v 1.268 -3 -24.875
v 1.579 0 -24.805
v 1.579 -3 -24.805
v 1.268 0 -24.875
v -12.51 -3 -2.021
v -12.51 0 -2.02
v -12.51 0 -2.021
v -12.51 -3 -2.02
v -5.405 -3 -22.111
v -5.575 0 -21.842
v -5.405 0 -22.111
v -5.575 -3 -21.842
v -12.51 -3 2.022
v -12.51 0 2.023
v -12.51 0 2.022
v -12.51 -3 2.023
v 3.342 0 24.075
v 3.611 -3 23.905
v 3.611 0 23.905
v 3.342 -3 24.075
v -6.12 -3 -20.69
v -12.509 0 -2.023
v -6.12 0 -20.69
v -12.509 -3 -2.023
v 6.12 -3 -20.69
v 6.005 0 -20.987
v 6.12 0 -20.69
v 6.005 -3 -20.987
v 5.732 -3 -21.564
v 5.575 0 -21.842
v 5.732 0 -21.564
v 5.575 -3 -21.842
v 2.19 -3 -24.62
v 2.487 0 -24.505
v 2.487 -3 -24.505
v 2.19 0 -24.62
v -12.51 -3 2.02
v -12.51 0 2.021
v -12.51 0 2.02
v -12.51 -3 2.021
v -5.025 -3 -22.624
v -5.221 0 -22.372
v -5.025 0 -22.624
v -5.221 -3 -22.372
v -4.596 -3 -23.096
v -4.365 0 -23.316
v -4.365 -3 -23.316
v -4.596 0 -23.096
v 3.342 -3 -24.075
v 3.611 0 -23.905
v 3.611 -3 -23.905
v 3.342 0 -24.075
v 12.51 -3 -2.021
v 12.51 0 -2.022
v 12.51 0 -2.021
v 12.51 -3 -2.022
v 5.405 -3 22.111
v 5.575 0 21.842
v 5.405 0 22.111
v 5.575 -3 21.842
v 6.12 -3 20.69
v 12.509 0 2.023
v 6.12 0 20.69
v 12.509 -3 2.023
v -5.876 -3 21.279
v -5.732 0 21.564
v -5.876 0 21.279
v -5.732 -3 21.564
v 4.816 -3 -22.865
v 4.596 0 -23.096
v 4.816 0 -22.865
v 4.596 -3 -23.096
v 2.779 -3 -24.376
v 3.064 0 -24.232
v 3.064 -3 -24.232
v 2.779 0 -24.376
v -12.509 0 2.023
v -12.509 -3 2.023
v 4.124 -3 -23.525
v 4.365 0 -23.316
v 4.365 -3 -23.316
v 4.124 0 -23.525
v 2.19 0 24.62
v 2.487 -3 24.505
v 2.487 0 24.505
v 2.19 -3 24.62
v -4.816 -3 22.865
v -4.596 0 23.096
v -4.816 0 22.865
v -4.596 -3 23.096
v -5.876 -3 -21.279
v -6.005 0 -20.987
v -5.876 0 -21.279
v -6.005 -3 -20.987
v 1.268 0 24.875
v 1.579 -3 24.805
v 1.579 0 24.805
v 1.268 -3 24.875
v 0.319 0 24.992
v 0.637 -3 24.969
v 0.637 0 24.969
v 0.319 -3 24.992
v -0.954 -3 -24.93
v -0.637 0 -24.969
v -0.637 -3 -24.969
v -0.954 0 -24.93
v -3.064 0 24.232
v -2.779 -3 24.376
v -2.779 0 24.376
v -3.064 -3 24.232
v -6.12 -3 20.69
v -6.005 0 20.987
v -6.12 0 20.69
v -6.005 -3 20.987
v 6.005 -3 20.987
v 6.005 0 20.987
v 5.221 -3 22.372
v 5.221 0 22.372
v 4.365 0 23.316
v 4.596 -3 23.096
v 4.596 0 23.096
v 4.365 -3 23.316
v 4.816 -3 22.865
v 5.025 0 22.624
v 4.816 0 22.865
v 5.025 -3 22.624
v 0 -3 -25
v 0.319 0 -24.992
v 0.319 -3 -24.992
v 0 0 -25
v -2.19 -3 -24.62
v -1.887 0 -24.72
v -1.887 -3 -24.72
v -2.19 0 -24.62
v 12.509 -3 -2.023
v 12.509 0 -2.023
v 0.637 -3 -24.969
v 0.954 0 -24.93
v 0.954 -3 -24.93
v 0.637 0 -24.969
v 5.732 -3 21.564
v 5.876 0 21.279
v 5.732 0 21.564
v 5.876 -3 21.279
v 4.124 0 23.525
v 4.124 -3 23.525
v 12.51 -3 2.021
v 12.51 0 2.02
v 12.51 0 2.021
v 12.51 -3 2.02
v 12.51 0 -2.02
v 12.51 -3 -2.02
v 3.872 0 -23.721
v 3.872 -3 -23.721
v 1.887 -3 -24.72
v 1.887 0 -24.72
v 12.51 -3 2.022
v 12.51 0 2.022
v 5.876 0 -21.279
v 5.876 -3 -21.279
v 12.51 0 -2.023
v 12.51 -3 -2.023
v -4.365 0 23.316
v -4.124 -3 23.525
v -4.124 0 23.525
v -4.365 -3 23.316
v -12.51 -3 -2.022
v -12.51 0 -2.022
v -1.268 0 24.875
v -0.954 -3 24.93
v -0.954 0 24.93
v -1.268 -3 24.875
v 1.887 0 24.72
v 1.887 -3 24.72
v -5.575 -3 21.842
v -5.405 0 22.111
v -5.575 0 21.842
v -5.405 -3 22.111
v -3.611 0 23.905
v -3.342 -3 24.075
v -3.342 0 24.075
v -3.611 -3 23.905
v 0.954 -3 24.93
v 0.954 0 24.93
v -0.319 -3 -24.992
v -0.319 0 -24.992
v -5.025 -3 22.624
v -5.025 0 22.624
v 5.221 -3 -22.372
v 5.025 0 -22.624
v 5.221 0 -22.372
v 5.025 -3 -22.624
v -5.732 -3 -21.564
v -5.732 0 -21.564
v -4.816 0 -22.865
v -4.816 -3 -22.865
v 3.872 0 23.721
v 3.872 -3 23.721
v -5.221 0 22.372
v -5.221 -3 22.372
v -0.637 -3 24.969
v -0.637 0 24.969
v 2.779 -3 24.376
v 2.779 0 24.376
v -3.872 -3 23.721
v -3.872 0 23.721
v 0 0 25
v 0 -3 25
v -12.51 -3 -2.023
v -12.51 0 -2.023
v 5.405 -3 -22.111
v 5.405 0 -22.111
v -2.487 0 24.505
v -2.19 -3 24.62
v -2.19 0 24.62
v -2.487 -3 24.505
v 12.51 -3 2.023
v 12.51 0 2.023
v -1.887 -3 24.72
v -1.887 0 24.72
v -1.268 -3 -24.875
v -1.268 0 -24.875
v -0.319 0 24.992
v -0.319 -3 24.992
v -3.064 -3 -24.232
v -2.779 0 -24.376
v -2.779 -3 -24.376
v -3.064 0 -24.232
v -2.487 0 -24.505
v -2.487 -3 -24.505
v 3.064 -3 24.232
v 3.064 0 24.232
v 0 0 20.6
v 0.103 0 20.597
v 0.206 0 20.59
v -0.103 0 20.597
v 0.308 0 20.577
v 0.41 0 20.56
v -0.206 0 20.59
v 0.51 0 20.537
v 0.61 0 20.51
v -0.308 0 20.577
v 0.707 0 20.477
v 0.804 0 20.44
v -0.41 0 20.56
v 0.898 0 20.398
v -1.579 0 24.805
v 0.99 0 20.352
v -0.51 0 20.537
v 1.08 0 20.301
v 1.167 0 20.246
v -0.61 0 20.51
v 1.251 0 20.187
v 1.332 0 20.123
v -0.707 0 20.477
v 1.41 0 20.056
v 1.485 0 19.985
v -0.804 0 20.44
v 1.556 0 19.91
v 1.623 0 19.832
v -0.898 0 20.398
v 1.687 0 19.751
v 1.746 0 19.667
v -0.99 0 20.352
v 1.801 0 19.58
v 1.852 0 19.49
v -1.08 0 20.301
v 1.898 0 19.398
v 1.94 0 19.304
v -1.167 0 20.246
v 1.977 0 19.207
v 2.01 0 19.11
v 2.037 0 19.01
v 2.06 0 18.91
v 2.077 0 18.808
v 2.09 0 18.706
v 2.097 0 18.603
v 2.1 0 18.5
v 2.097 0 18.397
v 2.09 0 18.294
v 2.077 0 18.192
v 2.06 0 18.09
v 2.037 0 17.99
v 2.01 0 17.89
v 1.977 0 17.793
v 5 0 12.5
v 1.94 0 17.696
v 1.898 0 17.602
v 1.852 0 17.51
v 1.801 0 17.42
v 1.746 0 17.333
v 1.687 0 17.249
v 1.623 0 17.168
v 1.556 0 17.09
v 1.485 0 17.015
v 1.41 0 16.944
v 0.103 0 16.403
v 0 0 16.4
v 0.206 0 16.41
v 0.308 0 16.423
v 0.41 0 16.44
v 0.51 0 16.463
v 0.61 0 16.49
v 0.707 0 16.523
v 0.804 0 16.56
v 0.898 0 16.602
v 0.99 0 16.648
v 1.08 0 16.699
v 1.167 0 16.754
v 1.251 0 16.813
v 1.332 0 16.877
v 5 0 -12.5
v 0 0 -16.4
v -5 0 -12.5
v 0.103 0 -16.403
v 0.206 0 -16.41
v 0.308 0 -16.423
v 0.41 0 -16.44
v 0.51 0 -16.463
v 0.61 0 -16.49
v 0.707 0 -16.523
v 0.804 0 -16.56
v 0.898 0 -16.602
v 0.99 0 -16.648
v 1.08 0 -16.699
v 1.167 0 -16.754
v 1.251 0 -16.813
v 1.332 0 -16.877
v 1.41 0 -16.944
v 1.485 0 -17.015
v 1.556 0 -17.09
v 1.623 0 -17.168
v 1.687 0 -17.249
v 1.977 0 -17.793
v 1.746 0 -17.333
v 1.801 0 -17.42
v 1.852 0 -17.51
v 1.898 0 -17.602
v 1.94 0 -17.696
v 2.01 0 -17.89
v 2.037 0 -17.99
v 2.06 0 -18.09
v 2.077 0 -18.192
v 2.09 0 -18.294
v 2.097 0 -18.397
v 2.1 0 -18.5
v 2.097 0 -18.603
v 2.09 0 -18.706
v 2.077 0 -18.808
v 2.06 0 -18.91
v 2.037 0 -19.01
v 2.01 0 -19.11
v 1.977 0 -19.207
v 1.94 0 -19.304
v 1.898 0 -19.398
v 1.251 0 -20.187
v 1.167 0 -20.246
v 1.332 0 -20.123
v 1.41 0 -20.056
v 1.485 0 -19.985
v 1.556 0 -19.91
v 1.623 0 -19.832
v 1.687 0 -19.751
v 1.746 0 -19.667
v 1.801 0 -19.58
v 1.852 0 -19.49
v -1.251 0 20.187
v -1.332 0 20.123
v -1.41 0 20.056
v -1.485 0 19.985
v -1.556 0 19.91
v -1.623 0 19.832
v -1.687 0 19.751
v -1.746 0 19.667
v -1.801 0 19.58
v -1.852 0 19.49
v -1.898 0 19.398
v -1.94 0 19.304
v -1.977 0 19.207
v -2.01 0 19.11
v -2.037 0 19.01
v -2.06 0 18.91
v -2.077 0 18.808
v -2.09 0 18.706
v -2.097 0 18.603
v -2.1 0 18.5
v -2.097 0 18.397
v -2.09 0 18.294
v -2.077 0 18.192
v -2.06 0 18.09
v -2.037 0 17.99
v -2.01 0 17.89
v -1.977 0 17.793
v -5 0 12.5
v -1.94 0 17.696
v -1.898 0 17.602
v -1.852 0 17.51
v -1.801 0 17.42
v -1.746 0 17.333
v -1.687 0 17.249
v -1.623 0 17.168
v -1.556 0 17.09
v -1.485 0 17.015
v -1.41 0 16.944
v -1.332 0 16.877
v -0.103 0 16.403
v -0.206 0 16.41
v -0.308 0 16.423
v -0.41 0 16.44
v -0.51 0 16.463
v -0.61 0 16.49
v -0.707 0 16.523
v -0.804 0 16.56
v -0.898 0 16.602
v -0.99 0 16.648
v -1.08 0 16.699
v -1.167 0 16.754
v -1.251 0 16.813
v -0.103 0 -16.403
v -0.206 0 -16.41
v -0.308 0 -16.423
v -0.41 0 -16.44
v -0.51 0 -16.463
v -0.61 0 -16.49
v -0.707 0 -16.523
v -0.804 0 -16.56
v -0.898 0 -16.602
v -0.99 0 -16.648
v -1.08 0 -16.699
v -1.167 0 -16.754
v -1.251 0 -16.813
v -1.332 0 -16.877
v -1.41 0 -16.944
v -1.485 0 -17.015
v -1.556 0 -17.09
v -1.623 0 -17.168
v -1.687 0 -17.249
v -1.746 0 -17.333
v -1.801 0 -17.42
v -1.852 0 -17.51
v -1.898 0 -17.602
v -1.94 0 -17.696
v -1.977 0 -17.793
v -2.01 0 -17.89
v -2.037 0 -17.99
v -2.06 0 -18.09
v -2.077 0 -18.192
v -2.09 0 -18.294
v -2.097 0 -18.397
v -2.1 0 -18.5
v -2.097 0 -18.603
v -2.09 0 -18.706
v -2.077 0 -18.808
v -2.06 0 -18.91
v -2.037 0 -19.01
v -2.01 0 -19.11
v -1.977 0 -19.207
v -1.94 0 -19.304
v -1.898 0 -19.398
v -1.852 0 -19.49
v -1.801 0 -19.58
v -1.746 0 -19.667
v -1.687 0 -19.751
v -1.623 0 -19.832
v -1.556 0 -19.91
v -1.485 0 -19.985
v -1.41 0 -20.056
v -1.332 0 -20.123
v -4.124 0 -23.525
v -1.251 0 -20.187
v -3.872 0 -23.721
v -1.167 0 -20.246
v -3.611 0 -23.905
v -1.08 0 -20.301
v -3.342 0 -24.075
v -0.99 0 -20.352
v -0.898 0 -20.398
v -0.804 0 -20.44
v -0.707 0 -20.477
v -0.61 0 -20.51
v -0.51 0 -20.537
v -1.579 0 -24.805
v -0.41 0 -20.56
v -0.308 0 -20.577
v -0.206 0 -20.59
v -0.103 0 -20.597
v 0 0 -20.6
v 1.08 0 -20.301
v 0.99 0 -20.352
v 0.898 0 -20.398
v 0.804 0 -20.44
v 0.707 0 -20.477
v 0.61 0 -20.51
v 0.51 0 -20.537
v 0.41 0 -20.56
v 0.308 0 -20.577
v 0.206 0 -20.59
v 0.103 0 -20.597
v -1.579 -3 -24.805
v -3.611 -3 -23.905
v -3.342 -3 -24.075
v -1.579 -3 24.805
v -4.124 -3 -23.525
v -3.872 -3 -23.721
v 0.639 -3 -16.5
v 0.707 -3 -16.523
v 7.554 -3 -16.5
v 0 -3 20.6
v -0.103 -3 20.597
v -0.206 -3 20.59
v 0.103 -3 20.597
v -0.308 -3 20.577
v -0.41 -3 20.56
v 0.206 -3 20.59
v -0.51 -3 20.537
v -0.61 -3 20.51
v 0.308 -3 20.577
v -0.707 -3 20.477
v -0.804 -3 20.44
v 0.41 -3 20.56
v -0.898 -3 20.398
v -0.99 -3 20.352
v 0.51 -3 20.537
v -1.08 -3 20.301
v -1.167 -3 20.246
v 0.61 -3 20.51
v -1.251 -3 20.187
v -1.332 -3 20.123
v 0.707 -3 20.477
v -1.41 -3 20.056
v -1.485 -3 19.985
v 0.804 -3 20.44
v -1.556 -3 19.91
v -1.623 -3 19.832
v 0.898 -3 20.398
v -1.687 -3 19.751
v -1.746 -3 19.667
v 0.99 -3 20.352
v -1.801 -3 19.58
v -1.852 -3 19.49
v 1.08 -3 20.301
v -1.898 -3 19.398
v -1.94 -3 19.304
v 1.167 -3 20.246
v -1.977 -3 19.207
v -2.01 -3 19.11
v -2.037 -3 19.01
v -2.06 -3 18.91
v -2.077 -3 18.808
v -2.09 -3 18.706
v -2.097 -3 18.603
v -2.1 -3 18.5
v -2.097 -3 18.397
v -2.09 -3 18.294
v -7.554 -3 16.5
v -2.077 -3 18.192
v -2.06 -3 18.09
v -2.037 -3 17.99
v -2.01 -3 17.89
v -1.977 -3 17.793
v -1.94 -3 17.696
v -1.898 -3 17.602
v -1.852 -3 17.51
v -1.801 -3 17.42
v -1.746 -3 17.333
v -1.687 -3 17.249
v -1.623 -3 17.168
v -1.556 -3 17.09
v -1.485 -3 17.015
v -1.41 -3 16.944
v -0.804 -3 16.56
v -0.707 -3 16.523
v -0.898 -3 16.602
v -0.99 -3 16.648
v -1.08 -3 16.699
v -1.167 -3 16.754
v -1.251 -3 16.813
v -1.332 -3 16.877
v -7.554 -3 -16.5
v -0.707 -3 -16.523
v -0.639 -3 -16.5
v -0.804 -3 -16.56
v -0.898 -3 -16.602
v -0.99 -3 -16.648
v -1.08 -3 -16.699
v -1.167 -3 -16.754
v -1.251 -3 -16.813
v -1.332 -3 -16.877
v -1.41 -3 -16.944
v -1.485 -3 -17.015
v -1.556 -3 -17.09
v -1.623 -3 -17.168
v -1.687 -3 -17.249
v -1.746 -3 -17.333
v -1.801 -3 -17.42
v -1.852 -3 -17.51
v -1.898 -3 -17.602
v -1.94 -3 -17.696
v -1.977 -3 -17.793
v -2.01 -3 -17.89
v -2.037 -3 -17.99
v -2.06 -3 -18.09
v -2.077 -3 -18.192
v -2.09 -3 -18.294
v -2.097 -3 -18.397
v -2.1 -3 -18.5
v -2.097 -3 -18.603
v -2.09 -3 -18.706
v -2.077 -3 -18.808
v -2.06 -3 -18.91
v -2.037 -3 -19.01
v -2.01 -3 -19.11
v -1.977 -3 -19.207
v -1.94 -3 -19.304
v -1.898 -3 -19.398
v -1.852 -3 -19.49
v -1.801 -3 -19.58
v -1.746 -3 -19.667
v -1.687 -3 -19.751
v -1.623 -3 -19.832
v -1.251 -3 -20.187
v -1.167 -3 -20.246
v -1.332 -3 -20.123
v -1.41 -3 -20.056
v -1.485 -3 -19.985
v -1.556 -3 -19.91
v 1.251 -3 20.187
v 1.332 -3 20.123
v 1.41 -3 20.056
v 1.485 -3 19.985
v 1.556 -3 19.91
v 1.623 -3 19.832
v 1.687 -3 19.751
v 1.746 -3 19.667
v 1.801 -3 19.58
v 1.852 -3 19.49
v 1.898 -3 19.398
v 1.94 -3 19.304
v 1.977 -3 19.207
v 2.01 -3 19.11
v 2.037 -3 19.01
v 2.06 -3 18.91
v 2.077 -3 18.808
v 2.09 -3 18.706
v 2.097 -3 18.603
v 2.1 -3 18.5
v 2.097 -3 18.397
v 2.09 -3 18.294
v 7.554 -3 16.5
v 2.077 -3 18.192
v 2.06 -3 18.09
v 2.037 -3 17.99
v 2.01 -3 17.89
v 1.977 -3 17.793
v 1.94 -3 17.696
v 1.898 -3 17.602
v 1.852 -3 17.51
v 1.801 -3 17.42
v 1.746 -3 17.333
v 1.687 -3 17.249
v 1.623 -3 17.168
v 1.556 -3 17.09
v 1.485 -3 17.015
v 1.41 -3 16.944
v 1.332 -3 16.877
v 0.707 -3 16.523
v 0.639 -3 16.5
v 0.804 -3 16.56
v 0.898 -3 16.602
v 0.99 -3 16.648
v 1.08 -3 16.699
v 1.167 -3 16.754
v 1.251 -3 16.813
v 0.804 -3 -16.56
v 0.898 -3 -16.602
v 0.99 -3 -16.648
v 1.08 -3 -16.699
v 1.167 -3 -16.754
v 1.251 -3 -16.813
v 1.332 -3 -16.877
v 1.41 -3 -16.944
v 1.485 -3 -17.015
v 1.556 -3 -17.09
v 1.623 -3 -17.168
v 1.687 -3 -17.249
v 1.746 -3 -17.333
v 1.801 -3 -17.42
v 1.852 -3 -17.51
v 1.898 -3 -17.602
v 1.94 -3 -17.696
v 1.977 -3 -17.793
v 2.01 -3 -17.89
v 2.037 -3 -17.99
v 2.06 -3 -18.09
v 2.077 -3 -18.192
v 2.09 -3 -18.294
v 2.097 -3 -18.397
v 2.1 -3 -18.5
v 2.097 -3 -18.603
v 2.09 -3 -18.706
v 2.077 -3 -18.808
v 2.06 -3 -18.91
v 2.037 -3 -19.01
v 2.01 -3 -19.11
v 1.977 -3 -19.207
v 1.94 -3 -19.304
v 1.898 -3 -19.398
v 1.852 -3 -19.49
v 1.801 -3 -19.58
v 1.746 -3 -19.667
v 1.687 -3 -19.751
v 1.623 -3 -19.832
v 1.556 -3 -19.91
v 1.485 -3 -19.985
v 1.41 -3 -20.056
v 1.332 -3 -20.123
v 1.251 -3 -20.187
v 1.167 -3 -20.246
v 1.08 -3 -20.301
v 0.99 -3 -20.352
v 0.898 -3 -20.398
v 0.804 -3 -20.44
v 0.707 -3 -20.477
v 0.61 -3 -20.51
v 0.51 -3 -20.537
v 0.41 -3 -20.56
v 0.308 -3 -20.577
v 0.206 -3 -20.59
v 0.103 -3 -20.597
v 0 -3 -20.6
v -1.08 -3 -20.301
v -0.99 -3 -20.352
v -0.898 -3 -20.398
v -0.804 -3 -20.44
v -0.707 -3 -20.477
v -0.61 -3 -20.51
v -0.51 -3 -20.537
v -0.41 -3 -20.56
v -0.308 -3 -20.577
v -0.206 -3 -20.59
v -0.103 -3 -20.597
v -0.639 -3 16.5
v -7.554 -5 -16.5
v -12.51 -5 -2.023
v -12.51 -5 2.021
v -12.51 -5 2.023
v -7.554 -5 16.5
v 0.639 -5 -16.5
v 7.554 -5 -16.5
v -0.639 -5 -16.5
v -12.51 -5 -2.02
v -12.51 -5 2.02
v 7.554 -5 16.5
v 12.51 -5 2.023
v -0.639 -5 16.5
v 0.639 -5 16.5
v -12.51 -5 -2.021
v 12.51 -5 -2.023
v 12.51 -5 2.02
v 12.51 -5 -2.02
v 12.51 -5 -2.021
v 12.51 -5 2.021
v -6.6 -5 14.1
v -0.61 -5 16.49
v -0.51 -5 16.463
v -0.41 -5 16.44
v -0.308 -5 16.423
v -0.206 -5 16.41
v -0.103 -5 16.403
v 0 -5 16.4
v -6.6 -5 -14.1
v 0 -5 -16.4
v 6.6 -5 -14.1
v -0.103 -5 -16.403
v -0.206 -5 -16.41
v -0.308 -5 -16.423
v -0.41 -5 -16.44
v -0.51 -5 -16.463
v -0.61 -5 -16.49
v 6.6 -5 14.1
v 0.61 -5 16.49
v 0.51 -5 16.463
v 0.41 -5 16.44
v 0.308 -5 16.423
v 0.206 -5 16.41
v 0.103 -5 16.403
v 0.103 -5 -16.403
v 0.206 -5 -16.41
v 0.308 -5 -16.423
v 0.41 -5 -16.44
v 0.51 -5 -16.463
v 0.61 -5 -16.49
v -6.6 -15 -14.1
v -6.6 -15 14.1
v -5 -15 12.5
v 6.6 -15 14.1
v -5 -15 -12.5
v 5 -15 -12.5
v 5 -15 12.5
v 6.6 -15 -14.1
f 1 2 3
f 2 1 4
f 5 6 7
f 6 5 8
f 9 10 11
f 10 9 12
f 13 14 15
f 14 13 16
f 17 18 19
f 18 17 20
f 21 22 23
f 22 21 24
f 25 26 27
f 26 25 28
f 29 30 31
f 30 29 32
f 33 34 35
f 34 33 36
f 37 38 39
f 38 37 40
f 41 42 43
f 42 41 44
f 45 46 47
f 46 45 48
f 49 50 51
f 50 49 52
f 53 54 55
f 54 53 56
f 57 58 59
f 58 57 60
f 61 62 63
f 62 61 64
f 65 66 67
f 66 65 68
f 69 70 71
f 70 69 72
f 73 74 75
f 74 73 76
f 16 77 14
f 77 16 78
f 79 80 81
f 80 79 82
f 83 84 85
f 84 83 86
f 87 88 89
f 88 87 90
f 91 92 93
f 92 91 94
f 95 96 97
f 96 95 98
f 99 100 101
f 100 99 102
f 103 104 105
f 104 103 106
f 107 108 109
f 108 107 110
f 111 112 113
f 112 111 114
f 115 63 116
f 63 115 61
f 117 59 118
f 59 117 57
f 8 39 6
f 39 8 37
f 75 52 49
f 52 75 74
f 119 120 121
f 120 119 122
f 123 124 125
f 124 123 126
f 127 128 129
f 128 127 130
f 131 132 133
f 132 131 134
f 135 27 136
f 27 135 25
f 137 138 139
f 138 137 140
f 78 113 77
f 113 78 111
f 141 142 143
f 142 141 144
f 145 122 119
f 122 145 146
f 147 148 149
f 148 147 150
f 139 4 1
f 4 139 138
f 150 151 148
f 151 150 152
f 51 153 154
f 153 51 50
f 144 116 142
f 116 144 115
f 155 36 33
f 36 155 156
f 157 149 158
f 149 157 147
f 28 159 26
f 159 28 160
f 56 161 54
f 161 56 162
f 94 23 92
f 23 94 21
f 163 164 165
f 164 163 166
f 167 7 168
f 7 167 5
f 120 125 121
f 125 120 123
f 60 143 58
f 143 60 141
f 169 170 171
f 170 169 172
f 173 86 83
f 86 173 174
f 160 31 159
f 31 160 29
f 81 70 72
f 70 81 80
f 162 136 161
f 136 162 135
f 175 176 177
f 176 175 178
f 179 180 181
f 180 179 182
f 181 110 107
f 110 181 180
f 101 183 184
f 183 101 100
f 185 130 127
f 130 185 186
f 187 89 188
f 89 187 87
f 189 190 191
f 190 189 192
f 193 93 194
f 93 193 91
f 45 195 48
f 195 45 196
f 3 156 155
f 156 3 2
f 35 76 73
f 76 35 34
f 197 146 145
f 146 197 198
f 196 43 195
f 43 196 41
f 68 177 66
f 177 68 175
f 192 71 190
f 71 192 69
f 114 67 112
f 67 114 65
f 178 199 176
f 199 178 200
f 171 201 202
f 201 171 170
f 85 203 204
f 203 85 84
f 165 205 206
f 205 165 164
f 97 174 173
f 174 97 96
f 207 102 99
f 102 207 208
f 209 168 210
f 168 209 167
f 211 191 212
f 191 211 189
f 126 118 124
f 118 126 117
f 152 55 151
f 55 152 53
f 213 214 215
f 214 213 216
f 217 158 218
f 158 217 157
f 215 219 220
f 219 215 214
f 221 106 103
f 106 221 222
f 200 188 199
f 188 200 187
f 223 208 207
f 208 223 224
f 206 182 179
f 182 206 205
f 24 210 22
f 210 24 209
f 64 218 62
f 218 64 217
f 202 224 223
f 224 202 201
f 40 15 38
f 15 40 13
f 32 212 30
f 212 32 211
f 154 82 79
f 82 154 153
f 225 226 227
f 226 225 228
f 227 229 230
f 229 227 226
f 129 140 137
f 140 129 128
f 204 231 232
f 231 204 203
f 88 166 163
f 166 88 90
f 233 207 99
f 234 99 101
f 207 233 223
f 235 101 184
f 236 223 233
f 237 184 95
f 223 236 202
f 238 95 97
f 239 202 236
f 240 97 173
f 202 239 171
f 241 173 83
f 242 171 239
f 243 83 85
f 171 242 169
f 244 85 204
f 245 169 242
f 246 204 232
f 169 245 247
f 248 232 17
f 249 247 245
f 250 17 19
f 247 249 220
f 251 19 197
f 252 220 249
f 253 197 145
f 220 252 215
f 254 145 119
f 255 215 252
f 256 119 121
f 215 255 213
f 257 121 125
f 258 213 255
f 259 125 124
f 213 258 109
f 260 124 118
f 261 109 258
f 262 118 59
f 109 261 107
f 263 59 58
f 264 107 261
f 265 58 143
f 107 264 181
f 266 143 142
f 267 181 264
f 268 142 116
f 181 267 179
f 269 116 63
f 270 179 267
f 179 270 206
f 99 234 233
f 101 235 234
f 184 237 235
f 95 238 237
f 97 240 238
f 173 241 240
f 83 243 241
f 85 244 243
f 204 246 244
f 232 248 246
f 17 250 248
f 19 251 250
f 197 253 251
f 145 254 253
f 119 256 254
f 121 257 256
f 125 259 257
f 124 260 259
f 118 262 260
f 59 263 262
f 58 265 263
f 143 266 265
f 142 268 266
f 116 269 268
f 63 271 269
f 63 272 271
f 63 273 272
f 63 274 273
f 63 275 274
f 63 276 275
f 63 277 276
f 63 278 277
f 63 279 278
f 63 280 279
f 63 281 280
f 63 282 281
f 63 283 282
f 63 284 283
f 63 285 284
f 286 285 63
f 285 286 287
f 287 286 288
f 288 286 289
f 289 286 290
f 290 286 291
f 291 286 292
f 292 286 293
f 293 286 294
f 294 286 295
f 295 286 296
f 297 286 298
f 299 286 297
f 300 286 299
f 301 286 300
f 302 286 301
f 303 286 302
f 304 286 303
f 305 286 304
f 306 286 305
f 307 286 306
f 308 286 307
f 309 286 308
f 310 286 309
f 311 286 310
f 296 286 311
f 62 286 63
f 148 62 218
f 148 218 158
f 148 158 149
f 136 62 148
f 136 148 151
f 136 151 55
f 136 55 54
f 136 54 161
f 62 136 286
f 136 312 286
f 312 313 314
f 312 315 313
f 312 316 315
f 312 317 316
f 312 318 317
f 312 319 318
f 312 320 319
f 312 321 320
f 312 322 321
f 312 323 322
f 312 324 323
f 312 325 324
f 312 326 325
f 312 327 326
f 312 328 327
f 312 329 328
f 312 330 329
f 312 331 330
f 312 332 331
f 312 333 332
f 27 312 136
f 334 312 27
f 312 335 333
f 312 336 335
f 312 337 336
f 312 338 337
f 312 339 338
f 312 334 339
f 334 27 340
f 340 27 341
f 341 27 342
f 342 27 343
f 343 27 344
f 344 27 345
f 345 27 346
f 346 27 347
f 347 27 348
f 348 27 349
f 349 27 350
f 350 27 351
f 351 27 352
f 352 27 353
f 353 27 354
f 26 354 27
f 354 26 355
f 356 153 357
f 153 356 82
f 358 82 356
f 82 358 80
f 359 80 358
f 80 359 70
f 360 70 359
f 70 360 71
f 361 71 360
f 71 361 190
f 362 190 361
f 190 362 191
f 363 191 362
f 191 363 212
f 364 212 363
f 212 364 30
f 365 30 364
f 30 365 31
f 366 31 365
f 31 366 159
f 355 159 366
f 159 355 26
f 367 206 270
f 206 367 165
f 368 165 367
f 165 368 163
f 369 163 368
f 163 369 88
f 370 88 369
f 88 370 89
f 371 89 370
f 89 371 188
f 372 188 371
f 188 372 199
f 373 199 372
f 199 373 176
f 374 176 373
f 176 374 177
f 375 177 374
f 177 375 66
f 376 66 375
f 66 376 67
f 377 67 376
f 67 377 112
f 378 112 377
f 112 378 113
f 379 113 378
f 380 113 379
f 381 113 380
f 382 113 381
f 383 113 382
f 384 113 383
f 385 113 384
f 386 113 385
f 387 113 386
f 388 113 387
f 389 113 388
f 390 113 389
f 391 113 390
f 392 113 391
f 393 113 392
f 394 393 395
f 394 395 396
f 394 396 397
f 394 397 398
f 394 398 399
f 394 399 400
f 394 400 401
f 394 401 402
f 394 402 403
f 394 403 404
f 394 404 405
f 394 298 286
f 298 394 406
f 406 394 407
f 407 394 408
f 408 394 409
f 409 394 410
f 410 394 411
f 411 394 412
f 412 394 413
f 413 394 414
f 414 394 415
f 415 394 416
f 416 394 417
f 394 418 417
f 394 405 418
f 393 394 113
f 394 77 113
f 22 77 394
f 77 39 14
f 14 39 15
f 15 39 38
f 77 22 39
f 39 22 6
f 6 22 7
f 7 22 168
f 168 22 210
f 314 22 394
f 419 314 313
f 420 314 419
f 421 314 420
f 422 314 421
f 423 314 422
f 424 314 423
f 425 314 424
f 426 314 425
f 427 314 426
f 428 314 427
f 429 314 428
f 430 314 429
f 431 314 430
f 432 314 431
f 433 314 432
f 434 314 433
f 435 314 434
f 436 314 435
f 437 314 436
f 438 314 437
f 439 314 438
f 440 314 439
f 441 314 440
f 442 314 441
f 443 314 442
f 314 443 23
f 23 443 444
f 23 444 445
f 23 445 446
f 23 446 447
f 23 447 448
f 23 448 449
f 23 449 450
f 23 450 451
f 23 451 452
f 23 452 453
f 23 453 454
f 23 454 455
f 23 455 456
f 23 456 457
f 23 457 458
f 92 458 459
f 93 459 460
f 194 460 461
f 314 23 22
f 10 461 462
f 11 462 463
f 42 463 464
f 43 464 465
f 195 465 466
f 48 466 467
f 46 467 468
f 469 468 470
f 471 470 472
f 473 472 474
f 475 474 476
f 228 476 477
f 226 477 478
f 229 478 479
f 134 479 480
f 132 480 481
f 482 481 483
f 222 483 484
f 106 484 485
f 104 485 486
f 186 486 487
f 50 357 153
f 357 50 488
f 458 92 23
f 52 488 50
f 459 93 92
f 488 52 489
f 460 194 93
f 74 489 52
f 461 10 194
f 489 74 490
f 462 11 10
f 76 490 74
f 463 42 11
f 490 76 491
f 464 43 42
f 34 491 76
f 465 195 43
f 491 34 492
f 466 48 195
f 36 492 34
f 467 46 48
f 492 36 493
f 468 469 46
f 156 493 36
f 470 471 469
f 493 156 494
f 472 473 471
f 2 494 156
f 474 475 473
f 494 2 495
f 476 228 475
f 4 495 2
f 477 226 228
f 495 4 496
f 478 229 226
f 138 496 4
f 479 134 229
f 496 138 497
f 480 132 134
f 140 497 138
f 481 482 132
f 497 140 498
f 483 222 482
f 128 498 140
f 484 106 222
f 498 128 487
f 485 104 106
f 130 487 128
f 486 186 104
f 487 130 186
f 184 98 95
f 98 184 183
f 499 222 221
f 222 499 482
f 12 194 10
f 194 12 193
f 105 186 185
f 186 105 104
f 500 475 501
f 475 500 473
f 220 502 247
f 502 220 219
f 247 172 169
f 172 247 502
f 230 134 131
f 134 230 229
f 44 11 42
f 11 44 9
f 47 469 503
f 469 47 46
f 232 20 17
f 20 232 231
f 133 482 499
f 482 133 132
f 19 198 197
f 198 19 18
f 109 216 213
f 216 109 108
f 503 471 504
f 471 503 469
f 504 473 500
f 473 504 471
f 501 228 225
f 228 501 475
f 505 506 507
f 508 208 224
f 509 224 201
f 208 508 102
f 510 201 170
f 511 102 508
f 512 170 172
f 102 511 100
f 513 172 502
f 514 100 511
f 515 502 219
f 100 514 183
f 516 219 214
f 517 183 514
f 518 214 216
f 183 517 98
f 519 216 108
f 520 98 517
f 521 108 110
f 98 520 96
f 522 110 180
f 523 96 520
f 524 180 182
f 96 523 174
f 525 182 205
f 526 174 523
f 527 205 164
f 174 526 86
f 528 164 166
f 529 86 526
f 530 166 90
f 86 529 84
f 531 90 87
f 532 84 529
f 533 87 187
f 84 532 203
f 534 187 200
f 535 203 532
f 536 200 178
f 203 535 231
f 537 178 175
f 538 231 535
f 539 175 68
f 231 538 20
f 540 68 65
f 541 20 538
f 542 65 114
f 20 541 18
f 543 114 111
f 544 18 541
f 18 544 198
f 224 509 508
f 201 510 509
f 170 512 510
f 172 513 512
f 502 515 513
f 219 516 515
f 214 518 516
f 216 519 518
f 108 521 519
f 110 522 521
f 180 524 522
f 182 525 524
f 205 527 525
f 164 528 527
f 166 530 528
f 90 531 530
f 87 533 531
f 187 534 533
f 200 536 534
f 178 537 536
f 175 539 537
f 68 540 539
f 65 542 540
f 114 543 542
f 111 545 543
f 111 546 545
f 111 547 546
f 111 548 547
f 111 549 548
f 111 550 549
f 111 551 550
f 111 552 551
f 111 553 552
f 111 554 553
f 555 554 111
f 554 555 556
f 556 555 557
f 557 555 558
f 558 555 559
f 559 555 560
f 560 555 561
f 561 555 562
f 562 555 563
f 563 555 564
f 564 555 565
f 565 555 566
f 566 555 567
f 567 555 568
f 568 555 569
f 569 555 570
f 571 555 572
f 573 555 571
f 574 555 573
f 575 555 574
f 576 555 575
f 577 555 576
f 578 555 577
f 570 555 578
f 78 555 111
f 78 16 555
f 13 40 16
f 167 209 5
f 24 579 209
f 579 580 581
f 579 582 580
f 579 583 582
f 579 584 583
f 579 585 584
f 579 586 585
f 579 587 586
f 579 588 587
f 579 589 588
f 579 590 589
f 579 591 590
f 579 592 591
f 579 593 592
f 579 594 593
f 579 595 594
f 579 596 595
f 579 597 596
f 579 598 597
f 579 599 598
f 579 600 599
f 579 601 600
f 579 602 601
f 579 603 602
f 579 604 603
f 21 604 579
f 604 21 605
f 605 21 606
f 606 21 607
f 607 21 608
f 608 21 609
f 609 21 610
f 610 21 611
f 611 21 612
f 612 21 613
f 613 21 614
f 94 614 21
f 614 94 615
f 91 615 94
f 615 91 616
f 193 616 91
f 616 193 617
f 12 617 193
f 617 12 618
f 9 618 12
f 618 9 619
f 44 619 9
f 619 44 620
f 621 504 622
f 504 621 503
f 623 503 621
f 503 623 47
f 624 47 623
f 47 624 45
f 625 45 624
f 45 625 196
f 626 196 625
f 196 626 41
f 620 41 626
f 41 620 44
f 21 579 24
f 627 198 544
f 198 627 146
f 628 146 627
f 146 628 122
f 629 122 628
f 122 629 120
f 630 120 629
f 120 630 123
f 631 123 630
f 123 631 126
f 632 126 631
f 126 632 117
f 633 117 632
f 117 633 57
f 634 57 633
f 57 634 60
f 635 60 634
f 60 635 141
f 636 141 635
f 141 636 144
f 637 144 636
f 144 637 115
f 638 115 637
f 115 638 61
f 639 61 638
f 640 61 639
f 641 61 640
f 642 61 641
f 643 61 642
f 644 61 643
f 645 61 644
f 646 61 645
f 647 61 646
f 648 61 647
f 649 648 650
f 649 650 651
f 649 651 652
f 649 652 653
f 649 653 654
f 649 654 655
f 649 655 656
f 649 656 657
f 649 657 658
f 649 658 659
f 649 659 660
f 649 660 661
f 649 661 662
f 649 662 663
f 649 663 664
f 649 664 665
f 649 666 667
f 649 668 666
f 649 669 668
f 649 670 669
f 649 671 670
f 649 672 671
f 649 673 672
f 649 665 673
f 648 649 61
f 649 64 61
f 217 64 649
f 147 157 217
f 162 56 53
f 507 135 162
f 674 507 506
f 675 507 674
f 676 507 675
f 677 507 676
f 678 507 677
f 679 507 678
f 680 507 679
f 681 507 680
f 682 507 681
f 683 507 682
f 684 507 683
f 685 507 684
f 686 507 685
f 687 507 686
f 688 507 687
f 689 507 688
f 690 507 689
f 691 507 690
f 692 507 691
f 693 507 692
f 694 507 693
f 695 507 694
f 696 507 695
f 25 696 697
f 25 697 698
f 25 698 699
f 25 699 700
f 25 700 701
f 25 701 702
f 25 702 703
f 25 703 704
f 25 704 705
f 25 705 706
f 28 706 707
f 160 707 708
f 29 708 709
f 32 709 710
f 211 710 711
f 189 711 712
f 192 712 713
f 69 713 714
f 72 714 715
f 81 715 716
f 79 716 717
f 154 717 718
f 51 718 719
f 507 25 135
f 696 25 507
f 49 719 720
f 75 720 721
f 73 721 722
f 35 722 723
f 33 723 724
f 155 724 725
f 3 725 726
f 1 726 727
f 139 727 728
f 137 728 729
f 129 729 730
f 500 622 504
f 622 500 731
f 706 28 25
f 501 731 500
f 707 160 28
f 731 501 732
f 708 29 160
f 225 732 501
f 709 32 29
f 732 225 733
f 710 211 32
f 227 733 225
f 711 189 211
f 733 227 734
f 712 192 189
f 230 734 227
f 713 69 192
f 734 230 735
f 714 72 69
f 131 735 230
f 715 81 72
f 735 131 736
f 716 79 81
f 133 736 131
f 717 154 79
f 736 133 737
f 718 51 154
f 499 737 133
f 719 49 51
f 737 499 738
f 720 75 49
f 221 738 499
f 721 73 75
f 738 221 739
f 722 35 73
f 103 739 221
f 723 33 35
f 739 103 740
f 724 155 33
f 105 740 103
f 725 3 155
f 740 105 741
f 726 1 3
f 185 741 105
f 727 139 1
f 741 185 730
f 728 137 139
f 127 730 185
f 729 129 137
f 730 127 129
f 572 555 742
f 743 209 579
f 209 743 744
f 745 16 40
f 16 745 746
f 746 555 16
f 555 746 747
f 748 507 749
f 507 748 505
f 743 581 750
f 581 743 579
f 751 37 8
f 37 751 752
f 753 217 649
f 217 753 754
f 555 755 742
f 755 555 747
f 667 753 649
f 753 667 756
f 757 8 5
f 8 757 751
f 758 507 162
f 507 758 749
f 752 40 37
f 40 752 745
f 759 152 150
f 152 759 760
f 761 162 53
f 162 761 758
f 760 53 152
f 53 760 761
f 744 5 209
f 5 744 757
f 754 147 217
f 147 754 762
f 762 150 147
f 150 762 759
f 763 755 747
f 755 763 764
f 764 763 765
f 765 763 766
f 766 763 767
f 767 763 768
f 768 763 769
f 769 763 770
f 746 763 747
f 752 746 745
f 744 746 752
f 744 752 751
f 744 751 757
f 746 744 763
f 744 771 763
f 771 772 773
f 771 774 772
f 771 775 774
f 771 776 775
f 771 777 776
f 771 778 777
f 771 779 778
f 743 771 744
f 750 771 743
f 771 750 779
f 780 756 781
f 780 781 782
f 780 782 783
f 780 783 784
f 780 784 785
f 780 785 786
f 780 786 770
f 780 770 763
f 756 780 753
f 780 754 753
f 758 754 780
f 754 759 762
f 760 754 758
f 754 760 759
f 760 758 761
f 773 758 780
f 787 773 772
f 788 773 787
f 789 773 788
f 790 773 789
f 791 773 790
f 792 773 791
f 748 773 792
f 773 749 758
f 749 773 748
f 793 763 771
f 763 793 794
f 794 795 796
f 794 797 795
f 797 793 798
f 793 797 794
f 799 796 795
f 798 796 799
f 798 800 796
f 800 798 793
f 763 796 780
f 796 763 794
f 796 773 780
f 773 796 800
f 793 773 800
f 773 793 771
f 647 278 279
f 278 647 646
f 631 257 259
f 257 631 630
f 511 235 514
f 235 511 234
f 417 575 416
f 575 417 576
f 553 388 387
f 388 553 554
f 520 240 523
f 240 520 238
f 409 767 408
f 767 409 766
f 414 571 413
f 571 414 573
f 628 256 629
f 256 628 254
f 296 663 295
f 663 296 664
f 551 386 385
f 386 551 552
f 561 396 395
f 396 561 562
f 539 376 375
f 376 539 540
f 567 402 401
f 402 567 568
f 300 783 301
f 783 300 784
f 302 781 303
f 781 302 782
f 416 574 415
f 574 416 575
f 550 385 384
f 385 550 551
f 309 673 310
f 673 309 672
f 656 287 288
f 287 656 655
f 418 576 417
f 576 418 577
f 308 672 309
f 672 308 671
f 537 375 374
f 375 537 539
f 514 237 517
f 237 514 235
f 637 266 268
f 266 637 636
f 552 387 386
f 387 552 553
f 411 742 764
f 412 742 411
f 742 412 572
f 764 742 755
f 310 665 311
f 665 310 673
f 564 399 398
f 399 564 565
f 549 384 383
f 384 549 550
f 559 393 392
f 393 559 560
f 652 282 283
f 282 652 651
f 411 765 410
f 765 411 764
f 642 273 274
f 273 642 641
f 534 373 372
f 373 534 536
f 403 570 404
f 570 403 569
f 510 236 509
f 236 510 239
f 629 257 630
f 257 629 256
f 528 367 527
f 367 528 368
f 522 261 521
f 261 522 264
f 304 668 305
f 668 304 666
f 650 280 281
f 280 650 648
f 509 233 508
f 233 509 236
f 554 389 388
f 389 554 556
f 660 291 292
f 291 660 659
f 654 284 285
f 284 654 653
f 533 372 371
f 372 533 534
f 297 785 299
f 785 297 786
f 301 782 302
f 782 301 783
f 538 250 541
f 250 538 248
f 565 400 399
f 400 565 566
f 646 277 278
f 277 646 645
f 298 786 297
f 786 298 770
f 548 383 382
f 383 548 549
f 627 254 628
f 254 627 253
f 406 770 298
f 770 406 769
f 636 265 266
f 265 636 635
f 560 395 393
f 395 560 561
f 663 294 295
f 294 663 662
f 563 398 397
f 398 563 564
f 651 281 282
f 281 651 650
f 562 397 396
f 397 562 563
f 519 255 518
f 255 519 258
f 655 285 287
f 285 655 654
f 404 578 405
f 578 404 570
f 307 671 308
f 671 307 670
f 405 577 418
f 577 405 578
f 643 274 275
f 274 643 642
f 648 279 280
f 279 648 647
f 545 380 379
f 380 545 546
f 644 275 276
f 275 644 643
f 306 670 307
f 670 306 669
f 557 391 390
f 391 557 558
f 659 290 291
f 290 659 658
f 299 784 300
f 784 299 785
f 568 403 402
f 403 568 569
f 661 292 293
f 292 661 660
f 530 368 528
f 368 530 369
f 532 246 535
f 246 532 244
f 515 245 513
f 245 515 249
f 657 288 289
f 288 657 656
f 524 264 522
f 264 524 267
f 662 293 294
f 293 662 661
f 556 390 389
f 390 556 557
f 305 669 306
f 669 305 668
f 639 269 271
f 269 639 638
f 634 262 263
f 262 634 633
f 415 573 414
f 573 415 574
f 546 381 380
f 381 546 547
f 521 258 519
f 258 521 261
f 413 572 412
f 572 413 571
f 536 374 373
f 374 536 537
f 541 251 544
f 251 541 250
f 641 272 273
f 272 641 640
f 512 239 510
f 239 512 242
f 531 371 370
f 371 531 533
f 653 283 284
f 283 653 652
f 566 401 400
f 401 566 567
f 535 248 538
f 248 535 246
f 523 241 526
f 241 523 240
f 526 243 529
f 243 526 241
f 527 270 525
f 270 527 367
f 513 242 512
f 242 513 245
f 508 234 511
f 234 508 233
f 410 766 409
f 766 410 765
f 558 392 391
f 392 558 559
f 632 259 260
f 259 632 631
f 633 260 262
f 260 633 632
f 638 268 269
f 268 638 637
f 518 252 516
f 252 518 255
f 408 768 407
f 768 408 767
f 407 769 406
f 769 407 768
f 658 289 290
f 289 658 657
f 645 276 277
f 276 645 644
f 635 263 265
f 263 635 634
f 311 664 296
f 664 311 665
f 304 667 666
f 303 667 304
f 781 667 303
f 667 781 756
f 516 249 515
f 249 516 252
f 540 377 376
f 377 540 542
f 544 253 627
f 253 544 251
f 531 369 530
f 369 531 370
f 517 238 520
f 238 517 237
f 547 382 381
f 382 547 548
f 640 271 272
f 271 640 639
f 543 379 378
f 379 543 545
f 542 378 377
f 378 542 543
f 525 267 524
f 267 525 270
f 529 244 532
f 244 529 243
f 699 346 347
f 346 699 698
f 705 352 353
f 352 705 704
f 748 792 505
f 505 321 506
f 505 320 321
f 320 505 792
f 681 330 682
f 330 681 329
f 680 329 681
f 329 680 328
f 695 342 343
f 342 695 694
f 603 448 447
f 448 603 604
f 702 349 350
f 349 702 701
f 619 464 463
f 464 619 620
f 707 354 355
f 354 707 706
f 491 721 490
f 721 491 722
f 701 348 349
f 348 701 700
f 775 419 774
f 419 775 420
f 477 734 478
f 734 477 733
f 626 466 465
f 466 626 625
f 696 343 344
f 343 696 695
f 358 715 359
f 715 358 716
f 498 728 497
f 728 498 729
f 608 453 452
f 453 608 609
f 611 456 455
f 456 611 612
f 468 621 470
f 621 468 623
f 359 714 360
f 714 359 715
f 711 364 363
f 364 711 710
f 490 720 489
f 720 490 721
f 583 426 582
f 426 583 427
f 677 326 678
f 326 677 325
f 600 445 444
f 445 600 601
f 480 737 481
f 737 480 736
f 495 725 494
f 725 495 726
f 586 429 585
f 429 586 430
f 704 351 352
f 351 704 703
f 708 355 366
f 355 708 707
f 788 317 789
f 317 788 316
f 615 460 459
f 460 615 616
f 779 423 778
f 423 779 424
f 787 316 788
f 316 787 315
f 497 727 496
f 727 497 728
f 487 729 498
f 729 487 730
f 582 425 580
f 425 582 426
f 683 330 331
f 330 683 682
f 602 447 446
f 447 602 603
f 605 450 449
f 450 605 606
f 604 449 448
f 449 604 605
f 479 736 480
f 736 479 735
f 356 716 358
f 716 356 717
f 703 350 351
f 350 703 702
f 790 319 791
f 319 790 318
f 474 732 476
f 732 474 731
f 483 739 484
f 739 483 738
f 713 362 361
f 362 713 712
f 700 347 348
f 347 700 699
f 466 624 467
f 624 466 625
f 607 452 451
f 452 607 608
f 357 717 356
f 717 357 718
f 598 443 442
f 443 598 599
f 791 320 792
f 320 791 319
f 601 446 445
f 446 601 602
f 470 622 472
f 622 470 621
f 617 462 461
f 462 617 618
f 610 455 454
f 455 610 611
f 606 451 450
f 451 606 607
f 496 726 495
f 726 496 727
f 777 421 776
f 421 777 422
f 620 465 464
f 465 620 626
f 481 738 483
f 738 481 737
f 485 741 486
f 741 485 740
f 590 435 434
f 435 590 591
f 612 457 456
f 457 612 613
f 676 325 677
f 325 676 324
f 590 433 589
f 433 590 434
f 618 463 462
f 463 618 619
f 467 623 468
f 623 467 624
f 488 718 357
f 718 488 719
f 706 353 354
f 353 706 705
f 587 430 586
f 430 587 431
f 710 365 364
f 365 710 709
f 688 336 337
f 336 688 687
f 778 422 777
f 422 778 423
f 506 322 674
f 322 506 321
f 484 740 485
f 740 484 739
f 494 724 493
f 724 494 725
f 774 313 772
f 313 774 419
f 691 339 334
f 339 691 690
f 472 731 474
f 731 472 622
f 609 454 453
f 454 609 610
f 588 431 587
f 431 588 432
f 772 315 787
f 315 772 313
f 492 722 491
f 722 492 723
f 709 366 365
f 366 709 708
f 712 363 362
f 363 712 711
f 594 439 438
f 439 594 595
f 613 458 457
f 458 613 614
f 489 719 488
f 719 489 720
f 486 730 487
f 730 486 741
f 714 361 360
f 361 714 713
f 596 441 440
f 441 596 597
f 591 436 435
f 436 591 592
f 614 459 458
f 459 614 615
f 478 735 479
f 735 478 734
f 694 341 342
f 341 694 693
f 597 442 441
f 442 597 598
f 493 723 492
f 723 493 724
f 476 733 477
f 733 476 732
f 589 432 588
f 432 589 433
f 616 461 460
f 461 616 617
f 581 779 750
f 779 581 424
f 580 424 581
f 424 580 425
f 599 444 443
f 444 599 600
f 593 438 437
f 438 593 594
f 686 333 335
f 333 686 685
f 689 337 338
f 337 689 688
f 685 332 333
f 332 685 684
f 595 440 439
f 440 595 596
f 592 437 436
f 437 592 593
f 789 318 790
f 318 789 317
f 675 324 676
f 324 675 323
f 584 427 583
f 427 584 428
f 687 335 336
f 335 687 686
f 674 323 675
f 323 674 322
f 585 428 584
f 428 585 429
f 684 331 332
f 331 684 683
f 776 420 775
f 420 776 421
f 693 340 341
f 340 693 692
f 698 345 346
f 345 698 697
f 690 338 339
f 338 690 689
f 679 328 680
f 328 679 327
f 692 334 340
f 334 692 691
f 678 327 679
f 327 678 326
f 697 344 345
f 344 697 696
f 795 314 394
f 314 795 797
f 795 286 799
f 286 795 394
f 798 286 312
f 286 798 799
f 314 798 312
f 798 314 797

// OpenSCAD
// ============================================
// Project: base.stl reconstruction
// Description: Two-bolt mounting flange with a hollow rectangular
//              socket protruding from a thickened central body.
// Author: Claude Code + User
// ============================================
// Original STL frame:  width=X (+-12.5), depth=Y (0 .. -15), height=Z (+-25)
// Modeled in a local frame (local x=width, local y=height), extruded along
// local +Z (=depth); rotate([90,0,0]) maps local +Z -> global -Y.

$fn = 128;
eps = 0.01;

// --- Flange outline (hexagonal diamond, two rounded lugs) ---
lug_r   = 6.5;     // [mm] lug radius
lug_z   = 18.5;    // [mm] lug centre height (+-)
tip_x   = 12.5;    // [mm] left/right vertex X
tip_z   = 2.02;    // [mm] half-height of vertical side edge

// --- Depths (along Y) ---
plate_t     = 3.0;     // [mm] thin lug-tab / front plate thickness
body_t      = 5.0;     // [mm] thickened central body thickness
body_clip_z = 16.5;    // [mm] central body half-height (lugs excluded)
total_depth = 15.0;    // [mm] overall Y depth

// --- Socket / window ---
box_w   = 13.2;    // [mm] socket outer width  (X)
box_h   = 28.2;    // [mm] socket outer height (Z)
win_w   = 10.0;    // [mm] window/bore width  (X)
win_h   = 25.0;    // [mm] window/bore height (Z)

bolt_d  = 4.2;     // [mm]

module flange() {
    hull() {
        translate([0,  lug_z]) circle(r = lug_r);
        translate([0, -lug_z]) circle(r = lug_r);
        translate([ tip_x,  tip_z]) circle(r = eps);
        translate([ tip_x, -tip_z]) circle(r = eps);
        translate([-tip_x,  tip_z]) circle(r = eps);
        translate([-tip_x, -tip_z]) circle(r = eps);
    }
}

// central body = diamond clipped to the mid band (lugs removed)
module body_outline() {
    intersection() {
        flange();
        square([2*tip_x + 2, 2*body_clip_z], center = true);
    }
}

module solid_body() {
    union() {
        linear_extrude(plate_t) flange();                          // full diamond, 3mm
        linear_extrude(body_t)  body_outline();                    // thick central body
        translate([0, 0, body_t])
            linear_extrude(total_depth - body_t)
                square([box_w, box_h], center = true);             // socket
    }
}

rotate([90, 0, 0])
difference() {
    solid_body();
    translate([0, 0, -eps])
        linear_extrude(total_depth + 2*eps)
            square([win_w, win_h], center = true);                 // through window
    for (s = [1, -1])
        translate([0, s*lug_z, -eps])
            linear_extrude(body_t + 2*eps)
                circle(d = bolt_d);                                // bolt holes
}

echo(str("BBOX target 25 x 15 x 50"));
